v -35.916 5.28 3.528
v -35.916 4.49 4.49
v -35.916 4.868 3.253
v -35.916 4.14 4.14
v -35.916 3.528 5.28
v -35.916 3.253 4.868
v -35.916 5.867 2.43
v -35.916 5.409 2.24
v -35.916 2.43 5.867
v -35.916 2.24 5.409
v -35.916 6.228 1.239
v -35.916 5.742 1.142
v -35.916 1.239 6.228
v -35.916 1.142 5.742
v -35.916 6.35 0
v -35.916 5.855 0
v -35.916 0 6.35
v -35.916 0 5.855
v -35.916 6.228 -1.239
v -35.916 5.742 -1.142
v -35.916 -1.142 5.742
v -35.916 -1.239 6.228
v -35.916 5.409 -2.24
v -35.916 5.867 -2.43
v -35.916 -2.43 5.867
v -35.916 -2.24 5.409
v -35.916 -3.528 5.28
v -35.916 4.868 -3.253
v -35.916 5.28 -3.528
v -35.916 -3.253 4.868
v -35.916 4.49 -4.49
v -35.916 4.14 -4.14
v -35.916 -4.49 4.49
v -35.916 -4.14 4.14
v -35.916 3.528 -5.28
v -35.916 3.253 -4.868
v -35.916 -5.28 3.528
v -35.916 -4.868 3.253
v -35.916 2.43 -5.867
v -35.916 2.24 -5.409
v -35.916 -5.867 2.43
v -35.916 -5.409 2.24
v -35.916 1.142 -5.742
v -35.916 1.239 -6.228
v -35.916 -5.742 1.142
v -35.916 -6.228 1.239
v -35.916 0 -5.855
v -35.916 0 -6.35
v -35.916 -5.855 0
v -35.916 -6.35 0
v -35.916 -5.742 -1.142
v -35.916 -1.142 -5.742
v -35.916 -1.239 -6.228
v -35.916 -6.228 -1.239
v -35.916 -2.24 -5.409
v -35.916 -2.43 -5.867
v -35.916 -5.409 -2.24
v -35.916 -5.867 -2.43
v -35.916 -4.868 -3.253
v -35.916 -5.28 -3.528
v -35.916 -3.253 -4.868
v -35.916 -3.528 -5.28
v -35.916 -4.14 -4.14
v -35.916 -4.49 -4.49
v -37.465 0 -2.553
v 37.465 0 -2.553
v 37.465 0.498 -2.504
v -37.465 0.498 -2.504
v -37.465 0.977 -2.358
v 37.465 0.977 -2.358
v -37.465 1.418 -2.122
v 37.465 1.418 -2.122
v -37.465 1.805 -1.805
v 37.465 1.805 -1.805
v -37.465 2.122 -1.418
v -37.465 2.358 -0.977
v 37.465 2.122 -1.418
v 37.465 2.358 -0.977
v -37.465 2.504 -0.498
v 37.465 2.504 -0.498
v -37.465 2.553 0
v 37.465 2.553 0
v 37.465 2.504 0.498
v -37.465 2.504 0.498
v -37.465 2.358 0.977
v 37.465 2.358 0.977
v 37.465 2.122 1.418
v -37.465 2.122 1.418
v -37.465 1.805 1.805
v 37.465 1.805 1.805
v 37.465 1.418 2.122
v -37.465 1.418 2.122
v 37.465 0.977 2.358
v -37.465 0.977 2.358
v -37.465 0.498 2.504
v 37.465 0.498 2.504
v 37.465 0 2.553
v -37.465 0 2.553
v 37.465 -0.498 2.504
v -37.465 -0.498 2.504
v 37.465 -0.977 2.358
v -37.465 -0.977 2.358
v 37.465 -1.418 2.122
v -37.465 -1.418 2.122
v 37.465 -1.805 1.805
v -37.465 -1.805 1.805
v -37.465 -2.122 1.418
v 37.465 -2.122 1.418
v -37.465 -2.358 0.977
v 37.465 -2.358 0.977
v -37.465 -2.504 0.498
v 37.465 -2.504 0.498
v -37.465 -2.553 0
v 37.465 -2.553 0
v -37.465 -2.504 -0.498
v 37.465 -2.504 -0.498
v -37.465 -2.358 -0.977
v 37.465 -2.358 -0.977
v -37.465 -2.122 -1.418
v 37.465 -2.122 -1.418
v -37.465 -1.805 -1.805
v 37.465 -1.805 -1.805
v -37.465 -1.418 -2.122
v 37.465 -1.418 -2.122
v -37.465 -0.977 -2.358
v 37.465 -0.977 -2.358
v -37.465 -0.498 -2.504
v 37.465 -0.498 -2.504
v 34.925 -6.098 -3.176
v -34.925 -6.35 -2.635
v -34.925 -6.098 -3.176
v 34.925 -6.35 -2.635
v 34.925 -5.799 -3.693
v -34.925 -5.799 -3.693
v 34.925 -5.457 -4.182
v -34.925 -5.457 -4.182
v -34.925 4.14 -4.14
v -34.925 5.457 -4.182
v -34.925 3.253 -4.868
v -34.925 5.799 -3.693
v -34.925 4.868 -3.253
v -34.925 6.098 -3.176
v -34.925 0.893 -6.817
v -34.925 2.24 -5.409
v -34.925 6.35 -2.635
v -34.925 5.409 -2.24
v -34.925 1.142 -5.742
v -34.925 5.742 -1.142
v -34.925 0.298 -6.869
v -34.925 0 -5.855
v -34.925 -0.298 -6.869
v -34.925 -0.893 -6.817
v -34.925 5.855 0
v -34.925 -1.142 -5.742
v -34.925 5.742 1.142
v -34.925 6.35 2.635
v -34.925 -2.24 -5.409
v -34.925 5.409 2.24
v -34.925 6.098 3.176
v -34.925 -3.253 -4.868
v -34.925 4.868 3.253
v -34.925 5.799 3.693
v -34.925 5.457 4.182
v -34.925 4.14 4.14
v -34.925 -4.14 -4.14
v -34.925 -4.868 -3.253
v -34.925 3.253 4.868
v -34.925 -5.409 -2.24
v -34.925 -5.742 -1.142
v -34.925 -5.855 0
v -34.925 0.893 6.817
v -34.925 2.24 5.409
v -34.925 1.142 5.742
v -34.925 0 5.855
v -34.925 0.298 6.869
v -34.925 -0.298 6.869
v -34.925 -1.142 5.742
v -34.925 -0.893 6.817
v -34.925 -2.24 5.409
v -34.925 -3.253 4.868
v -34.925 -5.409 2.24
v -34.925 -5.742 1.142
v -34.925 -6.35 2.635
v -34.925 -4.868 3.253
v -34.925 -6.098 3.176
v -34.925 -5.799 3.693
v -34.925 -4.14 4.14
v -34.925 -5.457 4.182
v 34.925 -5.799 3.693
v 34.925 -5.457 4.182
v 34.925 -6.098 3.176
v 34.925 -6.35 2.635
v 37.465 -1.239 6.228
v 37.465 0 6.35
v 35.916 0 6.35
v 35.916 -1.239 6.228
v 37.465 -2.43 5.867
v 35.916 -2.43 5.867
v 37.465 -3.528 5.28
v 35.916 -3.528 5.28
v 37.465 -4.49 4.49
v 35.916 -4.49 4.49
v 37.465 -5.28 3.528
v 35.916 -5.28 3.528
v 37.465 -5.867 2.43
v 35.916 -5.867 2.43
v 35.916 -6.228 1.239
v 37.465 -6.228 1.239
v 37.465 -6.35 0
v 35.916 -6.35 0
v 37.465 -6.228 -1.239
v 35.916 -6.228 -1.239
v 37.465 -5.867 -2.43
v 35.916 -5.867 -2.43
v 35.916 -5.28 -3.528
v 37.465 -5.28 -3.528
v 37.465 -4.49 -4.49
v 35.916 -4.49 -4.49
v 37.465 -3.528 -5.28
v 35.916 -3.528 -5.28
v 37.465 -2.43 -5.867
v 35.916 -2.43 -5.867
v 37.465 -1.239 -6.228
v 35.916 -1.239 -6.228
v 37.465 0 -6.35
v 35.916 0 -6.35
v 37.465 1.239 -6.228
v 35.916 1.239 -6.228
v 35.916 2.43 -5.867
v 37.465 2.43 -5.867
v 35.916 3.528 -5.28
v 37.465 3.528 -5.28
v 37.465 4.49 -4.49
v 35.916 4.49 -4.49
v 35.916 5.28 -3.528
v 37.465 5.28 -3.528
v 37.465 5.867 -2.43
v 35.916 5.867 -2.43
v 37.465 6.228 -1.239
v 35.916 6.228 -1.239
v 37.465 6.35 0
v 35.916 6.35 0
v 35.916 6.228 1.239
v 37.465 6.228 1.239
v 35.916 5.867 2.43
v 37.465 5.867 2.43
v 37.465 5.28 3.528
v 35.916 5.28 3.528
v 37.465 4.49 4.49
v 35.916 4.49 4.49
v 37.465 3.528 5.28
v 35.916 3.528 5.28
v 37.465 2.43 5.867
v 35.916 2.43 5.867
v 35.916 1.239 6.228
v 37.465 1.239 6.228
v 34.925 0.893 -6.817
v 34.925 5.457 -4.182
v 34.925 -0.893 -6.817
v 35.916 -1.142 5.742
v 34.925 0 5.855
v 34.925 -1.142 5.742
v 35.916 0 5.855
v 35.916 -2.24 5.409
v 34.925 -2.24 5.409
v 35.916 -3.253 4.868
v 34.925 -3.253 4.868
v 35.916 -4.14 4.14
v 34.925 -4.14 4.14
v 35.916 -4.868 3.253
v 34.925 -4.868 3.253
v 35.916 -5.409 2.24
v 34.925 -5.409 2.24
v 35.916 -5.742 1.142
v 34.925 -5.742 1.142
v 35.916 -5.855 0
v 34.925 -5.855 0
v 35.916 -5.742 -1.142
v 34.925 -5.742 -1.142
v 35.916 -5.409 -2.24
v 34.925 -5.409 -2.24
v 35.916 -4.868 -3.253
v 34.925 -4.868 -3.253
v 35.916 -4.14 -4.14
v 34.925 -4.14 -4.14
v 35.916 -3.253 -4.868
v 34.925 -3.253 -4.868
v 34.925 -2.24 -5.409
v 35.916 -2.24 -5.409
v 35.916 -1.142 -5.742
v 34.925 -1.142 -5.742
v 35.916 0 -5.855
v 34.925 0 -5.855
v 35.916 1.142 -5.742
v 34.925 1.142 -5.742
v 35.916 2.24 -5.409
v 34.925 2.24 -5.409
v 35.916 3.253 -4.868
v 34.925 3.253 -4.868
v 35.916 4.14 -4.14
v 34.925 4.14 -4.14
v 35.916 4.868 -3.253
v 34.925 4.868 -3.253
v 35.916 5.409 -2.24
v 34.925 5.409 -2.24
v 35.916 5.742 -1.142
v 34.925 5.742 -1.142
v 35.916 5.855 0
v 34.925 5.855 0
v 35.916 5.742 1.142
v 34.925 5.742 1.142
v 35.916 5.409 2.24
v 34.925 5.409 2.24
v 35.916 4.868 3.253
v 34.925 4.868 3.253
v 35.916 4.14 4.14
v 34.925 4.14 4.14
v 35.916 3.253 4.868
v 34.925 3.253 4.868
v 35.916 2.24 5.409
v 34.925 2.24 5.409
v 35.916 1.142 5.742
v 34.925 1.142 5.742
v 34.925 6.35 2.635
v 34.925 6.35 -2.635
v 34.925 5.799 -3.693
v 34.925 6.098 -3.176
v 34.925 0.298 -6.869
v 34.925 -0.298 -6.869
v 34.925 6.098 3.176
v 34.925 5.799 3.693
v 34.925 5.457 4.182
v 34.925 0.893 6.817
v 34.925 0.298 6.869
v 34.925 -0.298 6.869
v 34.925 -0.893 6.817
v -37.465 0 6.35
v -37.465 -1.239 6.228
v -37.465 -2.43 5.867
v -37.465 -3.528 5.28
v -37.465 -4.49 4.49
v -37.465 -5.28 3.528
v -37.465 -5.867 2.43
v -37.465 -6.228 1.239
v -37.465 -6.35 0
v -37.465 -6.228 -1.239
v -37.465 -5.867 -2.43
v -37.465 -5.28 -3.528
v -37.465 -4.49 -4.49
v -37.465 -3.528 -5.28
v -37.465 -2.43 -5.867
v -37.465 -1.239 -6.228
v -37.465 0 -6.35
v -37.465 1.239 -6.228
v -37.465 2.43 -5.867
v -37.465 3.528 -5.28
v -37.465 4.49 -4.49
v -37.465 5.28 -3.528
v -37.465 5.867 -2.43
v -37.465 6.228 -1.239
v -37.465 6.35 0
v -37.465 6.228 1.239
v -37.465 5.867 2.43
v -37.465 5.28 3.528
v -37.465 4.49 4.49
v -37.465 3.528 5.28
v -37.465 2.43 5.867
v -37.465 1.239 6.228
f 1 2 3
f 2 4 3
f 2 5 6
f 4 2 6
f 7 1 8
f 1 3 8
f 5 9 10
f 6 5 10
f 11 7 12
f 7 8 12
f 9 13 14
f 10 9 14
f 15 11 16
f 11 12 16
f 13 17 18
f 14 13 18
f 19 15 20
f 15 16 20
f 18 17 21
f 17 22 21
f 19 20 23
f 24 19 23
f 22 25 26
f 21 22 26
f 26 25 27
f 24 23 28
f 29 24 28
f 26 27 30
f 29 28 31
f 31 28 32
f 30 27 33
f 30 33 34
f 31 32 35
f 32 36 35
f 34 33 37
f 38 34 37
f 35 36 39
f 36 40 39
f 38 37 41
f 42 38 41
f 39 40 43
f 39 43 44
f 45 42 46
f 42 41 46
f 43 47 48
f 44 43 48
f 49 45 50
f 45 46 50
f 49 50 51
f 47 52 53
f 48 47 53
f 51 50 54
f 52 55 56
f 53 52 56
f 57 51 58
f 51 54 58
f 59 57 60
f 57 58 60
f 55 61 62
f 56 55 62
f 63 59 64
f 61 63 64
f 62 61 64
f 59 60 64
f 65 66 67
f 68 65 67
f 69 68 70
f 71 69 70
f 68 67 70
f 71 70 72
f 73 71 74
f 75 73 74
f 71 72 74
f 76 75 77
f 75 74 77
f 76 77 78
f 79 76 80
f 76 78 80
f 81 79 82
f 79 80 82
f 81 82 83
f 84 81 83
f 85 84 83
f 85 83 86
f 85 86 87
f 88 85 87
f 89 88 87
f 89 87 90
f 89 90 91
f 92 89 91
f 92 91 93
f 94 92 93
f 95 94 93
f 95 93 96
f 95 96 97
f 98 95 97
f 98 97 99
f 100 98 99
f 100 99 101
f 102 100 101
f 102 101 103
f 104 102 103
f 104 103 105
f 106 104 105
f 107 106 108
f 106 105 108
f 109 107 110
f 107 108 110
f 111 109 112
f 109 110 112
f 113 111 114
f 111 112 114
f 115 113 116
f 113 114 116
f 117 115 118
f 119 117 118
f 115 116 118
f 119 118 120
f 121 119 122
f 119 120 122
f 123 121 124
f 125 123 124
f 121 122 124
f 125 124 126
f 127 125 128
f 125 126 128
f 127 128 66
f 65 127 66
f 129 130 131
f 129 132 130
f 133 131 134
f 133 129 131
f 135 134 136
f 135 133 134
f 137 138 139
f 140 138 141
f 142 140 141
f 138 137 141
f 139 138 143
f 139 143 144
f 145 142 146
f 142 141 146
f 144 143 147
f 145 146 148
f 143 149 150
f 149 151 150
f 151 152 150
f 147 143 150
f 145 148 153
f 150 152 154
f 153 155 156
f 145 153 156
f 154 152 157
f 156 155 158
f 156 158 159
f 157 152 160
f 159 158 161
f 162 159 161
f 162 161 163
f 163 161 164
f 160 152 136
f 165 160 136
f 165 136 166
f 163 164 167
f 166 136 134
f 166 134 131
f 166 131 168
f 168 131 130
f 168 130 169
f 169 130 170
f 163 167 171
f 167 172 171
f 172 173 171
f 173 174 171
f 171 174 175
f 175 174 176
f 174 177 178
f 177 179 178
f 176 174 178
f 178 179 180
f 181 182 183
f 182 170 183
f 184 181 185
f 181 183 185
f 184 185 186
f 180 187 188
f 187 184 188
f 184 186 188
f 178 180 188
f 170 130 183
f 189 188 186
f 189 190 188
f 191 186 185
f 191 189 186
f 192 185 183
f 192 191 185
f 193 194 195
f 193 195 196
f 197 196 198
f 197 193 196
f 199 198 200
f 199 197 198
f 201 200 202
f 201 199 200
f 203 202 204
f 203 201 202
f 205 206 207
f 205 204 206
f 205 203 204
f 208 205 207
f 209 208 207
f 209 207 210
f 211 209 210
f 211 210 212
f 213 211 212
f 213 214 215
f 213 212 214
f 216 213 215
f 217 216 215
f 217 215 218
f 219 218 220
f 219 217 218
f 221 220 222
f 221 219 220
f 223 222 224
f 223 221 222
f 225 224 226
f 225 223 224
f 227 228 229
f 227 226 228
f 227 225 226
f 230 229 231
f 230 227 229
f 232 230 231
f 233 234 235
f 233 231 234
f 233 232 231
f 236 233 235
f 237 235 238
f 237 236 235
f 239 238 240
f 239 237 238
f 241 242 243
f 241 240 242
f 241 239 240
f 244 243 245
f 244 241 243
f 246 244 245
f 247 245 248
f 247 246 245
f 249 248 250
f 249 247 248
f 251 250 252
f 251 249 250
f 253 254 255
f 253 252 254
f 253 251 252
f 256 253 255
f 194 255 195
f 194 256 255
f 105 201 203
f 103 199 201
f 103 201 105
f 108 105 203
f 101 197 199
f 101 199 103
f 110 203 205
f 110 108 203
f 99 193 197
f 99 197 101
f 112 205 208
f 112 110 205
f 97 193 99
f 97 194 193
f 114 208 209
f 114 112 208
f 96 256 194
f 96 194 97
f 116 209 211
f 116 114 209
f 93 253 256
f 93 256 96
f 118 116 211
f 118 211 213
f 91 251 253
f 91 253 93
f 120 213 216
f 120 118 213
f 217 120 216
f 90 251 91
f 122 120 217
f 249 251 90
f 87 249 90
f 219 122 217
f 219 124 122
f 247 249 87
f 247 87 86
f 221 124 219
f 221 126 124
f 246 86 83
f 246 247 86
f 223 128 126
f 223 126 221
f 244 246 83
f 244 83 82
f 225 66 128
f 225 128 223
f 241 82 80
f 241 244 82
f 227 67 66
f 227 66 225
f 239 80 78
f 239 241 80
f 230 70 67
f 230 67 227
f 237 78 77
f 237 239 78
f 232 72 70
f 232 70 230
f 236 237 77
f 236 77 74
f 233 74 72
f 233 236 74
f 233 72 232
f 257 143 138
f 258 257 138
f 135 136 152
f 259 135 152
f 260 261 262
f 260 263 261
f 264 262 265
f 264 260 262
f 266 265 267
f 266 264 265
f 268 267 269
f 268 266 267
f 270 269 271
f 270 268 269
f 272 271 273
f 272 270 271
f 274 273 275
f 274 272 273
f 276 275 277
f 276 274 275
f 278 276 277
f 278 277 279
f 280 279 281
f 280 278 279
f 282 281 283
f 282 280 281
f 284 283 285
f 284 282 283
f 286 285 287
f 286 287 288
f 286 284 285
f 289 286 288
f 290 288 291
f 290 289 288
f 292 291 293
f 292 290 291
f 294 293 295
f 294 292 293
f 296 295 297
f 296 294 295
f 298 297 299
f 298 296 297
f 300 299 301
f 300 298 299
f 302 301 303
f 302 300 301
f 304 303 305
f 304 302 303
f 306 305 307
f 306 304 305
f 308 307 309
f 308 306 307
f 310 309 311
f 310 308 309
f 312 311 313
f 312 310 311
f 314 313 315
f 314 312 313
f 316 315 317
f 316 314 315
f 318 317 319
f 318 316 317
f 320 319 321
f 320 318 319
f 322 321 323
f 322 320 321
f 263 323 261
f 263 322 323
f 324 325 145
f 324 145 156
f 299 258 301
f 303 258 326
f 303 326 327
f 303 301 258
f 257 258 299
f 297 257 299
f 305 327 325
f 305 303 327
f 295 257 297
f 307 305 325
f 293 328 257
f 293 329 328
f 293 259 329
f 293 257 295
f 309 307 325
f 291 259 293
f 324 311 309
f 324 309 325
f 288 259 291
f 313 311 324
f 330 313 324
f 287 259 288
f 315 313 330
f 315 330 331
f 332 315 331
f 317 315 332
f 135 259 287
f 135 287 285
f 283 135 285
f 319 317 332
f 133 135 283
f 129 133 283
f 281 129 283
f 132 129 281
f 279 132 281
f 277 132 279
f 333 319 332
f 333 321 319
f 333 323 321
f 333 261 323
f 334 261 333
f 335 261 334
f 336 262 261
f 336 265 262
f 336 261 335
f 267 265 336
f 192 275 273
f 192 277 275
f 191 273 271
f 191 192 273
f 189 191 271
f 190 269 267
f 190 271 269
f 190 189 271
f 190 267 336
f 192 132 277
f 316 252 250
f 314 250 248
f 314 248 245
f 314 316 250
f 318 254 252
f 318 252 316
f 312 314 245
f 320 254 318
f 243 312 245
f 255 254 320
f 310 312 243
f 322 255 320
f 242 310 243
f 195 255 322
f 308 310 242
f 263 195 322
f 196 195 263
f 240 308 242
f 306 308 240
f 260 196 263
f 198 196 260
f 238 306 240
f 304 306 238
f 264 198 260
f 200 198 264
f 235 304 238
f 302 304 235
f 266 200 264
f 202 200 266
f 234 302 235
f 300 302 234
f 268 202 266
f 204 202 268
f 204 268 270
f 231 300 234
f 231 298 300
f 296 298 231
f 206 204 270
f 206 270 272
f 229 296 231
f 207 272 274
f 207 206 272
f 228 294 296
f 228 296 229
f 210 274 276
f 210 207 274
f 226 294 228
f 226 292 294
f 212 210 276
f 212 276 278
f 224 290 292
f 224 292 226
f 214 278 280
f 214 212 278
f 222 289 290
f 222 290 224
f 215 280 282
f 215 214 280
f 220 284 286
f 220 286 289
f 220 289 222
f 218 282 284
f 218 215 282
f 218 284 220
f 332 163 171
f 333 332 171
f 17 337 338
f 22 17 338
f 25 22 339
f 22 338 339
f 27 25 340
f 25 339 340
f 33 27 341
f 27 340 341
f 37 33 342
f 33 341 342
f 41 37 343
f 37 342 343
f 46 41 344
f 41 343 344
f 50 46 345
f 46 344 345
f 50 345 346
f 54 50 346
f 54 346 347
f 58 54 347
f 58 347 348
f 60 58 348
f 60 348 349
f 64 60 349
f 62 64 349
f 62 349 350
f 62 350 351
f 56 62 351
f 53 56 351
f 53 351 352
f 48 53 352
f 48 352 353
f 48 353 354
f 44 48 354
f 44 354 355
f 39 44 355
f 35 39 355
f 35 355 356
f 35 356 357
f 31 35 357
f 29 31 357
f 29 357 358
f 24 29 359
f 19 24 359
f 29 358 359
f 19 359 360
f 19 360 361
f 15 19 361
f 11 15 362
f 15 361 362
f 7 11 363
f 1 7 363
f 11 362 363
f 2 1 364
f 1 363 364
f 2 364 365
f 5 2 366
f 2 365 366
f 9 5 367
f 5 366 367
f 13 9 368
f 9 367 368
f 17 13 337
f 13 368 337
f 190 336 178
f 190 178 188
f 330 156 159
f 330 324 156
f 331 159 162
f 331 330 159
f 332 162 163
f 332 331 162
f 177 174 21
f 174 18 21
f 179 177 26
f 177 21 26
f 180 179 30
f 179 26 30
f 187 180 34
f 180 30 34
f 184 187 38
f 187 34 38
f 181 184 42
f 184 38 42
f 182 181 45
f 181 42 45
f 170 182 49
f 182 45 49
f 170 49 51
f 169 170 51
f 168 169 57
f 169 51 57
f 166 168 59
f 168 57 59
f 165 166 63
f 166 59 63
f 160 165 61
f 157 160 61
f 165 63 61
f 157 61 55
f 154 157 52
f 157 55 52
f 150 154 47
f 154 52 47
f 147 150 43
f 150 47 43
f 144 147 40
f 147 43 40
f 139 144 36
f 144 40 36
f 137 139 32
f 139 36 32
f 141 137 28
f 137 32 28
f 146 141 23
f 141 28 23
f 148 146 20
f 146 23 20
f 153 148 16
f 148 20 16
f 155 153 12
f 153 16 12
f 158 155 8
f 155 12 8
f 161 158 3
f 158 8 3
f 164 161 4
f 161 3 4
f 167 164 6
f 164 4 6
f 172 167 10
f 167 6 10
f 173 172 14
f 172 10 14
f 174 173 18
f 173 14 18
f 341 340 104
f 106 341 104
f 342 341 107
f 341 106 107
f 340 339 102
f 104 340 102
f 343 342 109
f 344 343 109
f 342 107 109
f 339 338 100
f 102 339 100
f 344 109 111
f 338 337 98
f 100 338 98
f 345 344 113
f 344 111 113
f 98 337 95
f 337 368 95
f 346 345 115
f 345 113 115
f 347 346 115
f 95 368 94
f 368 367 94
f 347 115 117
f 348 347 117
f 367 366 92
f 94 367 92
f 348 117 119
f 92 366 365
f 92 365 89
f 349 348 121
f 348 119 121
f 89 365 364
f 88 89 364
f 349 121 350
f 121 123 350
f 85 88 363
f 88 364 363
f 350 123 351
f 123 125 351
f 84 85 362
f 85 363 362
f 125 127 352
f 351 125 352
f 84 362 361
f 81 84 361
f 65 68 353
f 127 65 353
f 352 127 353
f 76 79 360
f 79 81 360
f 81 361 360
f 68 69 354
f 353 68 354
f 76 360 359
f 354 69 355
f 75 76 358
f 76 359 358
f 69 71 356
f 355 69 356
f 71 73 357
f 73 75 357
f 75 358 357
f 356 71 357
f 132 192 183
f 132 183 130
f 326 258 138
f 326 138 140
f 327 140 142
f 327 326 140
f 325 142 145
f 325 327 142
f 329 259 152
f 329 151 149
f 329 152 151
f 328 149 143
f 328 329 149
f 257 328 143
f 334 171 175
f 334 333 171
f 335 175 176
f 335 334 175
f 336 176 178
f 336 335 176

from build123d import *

# Parameters (mm, degrees)
BOSS_EXTRUDE1_DEPTH = 37.465
SKETCH3_R           = 7.332348419
SKETCH3_R_2         = 6.875
SKETCH3_R_3         = 2.5527
CUT_EXTRUDE1_DEPTH  = 76.555216453


with BuildPart() as part:
    # Sketch1 → Boss-Extrude1 (new, symmetric)
    with BuildSketch(Plane(origin=(0, 0, 0), x_dir=(0, 0, -1), z_dir=(1, 0, 0))):
        Polygon((7.332348419, 0), (3.666174209, 6.35), (-3.666174209, 6.35), (-7.332348419, 0), (-3.666174209, -6.35), (3.666174209, -6.35), align=None)
    extrude(amount=BOSS_EXTRUDE1_DEPTH, both=True)

    # Sketch2 → Cut-Revolve1 (revolve, cut)
    with BuildSketch(Plane(origin=(0, 0, 0), x_dir=(1, 0, 0), z_dir=(0, 1, 0))):
        Polygon((34.925, -5.8547), (35.9156, -5.8547), (35.9156, -6.35), (37.465, -6.35), (37.465, -8.89), (34.925, -8.89), align=None)
    cut_revolve1 = revolve(axis=Axis((0, 0, 0), (1, 0, 0)), mode=Mode.SUBTRACT)

    # Mirror1: Cut-Revolve1 across plane
    add(cut_revolve1.mirror(Plane(origin=(0, 0, 0), x_dir=(0, 0, 1), z_dir=(1, 0, 0))), mode=Mode.SUBTRACT)

    # Sketch3 → Cut-Extrude1 (cut, through all)
    # profile 1 of 2: a face of its own
    with BuildSketch(Plane(origin=(37.465, 0, 0), x_dir=(0, 0, -1), z_dir=(1, 0, 0))):
        Circle(SKETCH3_R)
        Circle(SKETCH3_R_2, mode=Mode.SUBTRACT)
    # profile 2 of 2: a face of its own
    with BuildSketch(Plane(origin=(37.465, 0, 0), x_dir=(0, 0, -1), z_dir=(1, 0, 0))):
        Circle(SKETCH3_R_3)
    extrude(amount=-CUT_EXTRUDE1_DEPTH, mode=Mode.SUBTRACT)


solid = part.part
